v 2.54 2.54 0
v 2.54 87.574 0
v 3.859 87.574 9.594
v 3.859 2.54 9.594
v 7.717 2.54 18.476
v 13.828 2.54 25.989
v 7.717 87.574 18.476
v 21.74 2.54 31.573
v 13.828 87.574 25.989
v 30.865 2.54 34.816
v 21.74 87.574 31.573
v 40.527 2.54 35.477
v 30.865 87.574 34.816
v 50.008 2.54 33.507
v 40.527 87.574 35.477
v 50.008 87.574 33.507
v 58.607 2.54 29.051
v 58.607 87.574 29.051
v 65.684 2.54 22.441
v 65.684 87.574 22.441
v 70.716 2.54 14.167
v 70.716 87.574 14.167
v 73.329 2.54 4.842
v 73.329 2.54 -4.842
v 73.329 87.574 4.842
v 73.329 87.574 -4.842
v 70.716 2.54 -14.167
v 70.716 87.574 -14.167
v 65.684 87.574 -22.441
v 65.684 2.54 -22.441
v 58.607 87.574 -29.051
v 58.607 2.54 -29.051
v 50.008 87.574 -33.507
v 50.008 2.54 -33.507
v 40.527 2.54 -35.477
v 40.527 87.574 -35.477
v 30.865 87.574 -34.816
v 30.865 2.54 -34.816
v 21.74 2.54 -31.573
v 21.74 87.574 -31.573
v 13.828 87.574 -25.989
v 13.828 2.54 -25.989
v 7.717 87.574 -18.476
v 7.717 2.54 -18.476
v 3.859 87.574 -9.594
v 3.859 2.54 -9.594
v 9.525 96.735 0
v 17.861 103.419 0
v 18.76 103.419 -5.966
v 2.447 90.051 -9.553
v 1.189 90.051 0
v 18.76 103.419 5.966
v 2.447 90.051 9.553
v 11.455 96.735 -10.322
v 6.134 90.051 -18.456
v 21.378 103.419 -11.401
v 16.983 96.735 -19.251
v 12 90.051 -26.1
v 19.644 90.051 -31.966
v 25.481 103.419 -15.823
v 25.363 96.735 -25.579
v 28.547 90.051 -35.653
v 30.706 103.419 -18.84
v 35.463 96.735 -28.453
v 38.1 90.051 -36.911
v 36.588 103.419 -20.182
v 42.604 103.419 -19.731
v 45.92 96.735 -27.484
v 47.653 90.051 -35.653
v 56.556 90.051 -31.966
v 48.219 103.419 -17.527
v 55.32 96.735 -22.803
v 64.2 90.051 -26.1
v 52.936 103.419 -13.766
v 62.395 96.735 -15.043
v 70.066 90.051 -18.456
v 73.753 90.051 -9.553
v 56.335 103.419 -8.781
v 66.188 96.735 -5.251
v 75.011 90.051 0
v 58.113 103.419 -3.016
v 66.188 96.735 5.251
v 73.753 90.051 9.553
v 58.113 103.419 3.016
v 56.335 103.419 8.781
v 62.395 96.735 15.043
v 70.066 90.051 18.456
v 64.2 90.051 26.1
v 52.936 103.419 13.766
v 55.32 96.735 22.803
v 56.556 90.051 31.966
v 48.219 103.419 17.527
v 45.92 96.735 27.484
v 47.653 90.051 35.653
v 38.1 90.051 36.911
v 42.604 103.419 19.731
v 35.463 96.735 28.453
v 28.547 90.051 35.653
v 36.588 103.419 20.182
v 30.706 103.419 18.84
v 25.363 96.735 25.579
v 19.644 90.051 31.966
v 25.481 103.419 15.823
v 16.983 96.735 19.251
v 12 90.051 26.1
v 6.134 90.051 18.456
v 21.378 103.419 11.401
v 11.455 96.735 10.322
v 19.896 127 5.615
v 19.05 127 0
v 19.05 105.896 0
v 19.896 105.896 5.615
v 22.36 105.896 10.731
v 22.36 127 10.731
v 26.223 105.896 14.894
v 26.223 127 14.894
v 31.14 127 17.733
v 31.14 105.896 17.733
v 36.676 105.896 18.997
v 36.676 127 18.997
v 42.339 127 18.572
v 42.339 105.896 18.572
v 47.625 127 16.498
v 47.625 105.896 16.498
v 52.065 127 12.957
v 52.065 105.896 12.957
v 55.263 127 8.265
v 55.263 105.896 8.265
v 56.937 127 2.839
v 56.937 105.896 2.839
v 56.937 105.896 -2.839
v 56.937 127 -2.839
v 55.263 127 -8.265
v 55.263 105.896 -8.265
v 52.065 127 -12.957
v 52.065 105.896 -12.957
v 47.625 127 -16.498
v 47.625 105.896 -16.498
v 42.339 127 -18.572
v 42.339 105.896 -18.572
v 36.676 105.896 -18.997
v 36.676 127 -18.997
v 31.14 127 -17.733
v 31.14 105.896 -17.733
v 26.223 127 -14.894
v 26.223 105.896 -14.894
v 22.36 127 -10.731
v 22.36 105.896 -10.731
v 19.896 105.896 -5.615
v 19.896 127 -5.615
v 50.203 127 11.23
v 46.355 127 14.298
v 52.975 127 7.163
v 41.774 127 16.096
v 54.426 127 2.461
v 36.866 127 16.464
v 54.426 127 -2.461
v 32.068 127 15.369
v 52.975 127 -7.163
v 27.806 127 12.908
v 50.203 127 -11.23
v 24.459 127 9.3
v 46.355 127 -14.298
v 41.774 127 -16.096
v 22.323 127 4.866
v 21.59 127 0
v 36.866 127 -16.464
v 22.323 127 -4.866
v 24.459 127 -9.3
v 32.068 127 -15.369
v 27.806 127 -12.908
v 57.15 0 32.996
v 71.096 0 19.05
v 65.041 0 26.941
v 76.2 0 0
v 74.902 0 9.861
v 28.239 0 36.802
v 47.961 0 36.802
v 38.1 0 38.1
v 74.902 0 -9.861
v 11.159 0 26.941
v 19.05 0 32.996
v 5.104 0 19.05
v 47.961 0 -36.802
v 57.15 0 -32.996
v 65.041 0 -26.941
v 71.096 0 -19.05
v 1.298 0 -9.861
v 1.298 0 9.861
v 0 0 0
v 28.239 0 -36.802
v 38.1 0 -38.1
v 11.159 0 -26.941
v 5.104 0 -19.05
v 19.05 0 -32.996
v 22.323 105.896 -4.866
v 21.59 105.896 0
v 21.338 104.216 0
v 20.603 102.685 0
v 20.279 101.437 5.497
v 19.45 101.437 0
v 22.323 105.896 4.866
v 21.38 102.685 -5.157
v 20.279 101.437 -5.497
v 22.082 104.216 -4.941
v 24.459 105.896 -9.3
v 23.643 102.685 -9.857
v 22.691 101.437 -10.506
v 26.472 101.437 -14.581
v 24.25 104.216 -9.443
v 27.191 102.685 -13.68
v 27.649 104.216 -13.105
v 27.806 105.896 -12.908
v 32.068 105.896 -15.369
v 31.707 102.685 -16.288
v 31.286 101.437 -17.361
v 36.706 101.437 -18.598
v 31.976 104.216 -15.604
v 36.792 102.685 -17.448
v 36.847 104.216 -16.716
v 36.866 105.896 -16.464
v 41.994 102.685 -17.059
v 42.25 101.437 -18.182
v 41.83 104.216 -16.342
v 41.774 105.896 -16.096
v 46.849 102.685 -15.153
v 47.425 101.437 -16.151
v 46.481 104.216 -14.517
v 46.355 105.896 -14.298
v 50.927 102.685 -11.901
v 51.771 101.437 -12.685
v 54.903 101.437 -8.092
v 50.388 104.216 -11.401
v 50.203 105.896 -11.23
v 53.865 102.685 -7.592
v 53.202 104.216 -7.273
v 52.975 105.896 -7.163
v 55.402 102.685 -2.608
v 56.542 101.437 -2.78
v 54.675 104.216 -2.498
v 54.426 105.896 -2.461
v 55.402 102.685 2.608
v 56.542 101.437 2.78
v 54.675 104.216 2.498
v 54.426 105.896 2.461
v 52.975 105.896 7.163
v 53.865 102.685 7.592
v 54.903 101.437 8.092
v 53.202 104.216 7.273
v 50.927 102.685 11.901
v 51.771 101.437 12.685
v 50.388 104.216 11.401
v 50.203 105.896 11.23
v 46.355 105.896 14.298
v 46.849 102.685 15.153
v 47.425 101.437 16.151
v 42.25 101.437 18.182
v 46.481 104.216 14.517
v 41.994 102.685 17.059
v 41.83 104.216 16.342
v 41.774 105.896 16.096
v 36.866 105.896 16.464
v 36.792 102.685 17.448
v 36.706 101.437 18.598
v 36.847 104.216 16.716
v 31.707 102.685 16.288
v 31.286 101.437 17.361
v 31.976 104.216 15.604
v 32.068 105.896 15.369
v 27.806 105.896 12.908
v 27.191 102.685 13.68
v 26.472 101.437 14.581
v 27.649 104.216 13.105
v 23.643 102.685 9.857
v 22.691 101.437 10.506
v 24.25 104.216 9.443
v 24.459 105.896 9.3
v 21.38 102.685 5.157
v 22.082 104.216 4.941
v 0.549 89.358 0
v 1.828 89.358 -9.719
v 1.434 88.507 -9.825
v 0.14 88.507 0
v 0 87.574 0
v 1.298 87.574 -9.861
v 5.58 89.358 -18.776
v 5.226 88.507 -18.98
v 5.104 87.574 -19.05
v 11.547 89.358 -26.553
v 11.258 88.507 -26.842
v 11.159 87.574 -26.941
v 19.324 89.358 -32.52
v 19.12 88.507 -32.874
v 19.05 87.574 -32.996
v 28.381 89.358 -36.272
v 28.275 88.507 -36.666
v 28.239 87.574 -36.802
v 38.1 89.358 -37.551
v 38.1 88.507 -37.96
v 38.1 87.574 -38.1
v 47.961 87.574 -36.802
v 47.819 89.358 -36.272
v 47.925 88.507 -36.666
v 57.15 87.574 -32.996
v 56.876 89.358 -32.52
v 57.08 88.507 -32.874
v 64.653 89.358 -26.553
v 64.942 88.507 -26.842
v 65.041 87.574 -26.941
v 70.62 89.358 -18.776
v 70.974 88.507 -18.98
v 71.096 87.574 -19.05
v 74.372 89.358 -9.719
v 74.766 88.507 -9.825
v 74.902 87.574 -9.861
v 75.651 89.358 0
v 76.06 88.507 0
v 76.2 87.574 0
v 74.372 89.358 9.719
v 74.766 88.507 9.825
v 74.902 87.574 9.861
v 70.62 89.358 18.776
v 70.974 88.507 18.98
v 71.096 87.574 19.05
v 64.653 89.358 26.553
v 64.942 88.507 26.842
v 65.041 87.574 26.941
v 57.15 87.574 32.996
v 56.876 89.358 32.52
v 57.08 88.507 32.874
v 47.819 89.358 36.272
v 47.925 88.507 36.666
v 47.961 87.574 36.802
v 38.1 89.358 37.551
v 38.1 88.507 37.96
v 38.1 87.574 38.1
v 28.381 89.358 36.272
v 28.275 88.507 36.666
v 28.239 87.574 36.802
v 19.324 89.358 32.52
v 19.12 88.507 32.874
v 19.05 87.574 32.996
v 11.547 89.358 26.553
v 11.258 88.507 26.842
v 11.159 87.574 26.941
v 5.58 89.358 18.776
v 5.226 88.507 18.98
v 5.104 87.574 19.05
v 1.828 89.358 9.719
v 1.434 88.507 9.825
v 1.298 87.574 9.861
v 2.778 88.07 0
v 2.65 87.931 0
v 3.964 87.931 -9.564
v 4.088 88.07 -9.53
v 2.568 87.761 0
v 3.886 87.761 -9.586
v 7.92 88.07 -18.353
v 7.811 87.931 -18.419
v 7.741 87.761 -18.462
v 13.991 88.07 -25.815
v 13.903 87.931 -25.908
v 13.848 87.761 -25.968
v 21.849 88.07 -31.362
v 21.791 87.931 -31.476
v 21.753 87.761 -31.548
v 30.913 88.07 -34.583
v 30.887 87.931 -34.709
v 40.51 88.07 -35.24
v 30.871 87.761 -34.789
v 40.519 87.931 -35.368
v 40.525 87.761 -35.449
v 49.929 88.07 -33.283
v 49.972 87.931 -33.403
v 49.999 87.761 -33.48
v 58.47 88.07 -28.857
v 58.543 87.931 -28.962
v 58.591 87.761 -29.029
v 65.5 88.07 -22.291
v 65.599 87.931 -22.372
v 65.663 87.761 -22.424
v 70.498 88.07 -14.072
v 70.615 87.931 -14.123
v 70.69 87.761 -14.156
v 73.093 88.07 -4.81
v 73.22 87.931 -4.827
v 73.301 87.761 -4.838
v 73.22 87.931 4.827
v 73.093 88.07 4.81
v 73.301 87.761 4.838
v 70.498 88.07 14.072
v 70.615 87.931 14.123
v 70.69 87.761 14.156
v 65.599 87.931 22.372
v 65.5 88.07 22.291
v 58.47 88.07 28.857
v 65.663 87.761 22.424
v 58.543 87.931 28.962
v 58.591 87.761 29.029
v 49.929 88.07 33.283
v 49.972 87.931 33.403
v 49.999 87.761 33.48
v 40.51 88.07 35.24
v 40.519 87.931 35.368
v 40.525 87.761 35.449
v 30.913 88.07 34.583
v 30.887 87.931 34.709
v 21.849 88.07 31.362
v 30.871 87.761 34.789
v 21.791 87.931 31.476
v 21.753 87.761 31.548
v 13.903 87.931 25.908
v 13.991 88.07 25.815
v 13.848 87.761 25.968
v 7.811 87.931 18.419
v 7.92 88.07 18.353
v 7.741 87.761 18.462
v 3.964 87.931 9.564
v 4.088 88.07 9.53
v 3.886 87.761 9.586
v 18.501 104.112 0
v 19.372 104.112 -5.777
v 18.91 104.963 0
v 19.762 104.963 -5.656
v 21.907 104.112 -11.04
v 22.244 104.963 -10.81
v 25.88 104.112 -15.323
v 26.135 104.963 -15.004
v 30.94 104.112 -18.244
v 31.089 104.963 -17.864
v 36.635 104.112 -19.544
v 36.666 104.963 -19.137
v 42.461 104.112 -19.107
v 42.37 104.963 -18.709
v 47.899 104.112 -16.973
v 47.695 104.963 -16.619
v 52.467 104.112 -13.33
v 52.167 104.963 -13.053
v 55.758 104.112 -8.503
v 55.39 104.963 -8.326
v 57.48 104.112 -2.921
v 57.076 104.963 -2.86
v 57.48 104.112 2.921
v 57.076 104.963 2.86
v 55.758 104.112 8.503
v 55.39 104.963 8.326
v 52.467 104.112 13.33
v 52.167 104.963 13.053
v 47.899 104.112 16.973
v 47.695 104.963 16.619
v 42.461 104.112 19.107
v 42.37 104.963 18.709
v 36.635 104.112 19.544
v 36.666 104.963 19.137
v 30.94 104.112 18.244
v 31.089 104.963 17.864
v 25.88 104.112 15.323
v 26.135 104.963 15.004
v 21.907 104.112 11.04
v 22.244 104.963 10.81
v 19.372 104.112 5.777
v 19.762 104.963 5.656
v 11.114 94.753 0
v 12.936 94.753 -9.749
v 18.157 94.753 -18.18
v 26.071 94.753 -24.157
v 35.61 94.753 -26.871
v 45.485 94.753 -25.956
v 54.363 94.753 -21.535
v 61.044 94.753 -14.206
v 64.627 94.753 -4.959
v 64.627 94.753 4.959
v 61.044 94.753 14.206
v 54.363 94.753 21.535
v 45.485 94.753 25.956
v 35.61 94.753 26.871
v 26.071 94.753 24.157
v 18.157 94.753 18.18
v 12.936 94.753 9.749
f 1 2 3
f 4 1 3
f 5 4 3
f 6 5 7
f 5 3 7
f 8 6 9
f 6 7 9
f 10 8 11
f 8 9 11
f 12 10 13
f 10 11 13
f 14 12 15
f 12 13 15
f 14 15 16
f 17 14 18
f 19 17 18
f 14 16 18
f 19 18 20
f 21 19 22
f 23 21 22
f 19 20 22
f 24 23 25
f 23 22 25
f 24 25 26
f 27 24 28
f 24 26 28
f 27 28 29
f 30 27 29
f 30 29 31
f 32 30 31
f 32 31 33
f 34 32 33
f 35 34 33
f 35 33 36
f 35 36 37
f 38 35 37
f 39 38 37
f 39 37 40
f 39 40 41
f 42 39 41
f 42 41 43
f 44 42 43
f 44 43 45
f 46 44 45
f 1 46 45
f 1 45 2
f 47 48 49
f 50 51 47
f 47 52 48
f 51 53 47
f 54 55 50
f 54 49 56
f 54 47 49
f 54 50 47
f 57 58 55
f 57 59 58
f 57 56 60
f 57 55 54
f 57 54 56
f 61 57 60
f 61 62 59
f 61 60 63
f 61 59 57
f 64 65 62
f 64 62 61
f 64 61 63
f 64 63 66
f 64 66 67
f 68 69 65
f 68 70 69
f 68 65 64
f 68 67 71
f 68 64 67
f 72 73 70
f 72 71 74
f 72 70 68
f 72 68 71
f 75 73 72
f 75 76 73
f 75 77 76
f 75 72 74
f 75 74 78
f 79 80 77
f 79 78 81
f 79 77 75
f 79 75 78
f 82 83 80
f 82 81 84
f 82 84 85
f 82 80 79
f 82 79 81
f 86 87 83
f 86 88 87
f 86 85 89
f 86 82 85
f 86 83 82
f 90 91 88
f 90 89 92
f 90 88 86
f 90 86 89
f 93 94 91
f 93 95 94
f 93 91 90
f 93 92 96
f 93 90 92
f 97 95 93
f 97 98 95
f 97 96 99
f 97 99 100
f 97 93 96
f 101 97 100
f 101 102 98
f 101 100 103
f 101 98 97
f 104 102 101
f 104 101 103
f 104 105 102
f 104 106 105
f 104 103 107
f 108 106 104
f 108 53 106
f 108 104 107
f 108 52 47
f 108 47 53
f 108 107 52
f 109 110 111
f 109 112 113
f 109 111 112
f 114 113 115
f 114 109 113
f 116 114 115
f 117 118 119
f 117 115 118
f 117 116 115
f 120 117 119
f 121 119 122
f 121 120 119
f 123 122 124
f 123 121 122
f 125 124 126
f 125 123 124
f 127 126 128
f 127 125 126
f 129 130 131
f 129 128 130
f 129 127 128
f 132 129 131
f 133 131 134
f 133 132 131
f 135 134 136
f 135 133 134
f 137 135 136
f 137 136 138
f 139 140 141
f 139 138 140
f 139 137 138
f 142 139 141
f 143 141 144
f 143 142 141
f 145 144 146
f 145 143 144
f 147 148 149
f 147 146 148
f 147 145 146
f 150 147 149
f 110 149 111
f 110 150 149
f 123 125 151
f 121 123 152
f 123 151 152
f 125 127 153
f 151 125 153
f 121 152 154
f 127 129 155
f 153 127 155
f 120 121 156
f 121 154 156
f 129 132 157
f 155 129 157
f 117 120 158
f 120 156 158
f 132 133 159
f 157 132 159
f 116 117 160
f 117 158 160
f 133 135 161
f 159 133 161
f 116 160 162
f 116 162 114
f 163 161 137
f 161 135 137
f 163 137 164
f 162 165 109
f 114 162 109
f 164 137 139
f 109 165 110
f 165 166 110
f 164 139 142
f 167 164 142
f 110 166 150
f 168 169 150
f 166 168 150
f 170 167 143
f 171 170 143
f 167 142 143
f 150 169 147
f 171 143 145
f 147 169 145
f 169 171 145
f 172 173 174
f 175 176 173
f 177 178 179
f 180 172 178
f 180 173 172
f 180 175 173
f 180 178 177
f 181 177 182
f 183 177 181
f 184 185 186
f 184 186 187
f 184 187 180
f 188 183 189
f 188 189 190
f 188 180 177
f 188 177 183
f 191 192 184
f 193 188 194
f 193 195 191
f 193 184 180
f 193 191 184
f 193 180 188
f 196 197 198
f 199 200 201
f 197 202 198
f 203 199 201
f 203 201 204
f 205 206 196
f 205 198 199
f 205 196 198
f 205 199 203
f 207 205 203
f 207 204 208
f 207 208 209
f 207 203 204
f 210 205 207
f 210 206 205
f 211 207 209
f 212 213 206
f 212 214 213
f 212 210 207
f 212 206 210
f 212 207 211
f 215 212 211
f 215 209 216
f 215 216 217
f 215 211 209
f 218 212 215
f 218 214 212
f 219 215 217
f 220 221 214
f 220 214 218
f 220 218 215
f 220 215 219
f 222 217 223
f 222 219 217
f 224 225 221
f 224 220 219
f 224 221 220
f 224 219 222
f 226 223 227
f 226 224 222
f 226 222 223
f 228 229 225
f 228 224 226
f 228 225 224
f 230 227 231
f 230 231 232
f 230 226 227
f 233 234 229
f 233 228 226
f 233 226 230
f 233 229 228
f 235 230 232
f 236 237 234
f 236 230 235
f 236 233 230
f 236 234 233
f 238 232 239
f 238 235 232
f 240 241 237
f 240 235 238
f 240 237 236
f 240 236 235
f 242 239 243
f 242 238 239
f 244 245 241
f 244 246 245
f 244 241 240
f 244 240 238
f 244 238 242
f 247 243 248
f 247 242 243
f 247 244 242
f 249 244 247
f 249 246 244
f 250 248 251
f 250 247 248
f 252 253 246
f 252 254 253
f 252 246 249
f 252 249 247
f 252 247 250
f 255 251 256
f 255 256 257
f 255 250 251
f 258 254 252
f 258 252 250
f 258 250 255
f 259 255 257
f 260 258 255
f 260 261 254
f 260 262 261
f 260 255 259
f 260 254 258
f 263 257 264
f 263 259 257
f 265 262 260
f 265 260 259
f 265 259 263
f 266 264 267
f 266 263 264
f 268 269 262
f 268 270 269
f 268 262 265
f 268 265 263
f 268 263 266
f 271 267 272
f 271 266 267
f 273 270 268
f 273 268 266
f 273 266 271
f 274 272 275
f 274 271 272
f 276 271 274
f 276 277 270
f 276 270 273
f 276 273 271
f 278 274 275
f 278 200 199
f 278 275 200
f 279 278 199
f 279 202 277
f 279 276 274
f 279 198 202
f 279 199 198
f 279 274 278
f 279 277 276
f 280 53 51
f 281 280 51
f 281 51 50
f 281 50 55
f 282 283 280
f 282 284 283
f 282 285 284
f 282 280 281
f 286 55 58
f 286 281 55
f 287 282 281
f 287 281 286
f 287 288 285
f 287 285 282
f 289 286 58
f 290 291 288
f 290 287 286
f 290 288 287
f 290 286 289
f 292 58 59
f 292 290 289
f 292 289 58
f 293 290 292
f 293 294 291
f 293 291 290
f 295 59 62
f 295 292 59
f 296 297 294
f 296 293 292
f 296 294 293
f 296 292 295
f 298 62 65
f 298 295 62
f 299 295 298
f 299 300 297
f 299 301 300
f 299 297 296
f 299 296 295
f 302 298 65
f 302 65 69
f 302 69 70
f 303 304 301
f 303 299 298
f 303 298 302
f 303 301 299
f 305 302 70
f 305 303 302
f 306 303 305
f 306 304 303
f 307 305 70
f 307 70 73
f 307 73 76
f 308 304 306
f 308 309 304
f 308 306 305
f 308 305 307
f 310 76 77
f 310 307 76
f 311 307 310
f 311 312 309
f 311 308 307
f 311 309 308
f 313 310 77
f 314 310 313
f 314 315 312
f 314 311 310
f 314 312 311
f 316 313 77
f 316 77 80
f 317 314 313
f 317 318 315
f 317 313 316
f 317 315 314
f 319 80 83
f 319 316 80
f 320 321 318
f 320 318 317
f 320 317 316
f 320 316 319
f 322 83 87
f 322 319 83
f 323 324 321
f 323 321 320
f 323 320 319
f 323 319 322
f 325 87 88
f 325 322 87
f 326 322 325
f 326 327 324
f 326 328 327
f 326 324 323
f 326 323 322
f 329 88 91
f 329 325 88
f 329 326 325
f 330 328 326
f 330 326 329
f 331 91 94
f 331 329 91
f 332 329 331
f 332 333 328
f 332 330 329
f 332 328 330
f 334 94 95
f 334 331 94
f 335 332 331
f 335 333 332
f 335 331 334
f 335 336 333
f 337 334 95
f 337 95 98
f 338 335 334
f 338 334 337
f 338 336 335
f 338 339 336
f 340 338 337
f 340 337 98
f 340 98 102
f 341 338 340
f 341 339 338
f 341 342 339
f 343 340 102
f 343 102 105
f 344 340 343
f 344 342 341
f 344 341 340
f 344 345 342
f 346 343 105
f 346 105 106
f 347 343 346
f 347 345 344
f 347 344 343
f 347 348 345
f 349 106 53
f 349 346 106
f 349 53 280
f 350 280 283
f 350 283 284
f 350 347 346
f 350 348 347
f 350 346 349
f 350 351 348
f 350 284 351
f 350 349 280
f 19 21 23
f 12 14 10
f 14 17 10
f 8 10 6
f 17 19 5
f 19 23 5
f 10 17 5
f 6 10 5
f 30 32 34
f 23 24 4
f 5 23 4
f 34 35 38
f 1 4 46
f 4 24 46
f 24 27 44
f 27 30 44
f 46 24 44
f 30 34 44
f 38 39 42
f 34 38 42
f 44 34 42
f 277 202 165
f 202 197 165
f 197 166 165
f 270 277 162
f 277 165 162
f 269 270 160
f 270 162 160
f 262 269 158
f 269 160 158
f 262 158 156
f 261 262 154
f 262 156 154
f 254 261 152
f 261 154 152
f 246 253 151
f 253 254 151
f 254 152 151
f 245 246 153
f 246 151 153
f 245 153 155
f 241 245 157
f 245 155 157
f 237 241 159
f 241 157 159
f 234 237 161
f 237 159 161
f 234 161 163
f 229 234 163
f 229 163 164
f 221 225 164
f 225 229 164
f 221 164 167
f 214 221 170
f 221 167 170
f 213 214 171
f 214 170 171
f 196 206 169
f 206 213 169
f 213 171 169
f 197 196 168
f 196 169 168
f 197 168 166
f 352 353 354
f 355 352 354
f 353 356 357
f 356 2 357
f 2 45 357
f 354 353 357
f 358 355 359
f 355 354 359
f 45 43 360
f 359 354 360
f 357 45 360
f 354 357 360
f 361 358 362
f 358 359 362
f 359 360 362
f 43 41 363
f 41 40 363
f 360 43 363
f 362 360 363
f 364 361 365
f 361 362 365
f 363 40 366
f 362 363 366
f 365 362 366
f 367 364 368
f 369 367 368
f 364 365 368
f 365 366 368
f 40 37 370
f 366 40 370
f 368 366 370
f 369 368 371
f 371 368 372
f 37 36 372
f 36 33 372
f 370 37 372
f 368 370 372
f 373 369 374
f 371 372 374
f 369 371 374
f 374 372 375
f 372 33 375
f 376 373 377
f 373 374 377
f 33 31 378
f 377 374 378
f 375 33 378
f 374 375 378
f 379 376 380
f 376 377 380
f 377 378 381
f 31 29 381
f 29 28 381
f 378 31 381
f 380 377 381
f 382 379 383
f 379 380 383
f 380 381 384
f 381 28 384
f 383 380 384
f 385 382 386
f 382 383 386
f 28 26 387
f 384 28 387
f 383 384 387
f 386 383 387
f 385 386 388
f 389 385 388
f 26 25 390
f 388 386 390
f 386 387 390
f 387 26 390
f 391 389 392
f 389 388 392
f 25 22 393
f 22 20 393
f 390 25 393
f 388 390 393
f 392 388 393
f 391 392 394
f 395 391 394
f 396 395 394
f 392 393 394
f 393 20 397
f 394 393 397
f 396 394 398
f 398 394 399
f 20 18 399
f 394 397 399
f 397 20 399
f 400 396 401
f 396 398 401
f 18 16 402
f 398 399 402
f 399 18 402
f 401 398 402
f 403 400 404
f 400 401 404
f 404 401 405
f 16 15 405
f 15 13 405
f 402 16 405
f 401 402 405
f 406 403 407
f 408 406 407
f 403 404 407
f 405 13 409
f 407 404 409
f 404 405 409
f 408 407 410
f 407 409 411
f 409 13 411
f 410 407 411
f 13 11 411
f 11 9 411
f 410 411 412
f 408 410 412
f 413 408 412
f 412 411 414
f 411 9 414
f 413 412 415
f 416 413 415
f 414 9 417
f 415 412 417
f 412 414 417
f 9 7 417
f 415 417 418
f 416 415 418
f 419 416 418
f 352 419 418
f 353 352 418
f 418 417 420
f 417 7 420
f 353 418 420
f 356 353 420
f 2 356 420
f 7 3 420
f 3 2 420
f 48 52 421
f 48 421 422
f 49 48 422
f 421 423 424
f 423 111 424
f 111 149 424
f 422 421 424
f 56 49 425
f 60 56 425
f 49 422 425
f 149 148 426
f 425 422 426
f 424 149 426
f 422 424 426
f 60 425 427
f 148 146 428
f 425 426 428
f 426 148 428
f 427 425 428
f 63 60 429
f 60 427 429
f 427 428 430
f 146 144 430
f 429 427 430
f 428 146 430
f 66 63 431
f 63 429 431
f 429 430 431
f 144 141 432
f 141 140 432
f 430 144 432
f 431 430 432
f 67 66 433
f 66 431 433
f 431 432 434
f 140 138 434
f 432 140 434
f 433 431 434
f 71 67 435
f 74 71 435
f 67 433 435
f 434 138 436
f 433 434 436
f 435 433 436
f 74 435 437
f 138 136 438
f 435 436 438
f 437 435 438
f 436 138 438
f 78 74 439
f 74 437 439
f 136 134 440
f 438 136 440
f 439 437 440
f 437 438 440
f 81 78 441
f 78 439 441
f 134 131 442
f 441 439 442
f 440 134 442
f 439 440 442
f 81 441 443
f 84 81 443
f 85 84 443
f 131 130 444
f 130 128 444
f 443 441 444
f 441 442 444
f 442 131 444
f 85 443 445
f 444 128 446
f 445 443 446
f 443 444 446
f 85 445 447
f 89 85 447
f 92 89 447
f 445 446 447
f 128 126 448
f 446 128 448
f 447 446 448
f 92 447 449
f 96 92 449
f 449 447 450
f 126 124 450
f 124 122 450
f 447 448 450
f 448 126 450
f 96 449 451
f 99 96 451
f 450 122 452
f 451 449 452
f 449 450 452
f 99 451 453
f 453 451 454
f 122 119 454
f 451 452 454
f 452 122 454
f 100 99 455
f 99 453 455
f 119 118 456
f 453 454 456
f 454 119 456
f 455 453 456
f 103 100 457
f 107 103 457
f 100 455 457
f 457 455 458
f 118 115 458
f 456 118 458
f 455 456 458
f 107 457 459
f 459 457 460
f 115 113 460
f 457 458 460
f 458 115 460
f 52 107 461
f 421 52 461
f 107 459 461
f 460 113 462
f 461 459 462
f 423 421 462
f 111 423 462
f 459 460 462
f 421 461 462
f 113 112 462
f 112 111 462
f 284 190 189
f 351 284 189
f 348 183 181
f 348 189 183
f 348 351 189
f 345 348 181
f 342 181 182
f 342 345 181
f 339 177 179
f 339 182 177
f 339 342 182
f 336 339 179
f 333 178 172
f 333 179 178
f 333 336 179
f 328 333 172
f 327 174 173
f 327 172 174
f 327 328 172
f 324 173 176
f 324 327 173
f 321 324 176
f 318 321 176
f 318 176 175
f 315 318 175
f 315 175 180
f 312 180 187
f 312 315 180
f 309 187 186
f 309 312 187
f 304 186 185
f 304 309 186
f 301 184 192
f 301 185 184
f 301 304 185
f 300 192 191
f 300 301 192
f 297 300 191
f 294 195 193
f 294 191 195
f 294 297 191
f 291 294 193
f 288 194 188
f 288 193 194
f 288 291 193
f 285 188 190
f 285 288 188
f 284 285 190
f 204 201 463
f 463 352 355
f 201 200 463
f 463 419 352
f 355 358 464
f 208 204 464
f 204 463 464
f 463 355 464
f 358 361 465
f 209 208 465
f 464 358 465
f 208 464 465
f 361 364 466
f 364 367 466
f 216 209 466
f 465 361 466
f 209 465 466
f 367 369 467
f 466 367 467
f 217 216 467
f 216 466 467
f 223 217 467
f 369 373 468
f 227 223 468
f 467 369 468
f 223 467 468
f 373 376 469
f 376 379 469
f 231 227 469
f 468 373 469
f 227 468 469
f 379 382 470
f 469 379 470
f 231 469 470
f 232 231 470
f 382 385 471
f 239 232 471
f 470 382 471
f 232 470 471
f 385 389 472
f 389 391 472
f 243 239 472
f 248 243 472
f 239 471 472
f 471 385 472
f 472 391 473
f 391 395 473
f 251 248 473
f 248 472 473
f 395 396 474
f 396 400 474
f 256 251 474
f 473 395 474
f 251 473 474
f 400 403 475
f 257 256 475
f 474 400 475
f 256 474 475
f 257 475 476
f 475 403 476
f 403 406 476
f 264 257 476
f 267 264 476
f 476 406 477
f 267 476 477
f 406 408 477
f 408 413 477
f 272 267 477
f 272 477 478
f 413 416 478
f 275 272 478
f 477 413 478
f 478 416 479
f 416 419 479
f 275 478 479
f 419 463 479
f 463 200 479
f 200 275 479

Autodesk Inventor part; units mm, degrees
ref_plane "YZ Plane" through (0, 0, 0) normal (1, 0, 0) x (0, 1, 0)
ref_plane "XZ Plane" through (0, 0, 0) normal (0, 1, 0) x (-1, 0, 0)
ref_plane "XY Plane" through (0, 0, 0) normal (0, 0, 1) x (1, 0, 0)
sketch "Sketch1" plane through (0, 0, 0) normal (0, 0, 1) x (1, 0, 0)
  line L0 (0, 0) -> (0, 87.5741)
  line L1 (1.1889, 90.0512) -> (17.8611, 103.4187)
  line L2 (19.05, 105.8958) -> (19.05, 127)
  line L3 (19.05, 127) -> (38.1, 127)
  line L4 (38.1, 127) -> (38.1, 0)
  line L5 (38.1, 0) -> (0, 0)
  arc A0 (17.8611, 103.4187) -> (19.05, 105.8958) centre (15.875, 105.8958) ccw
  arc A1 (1.1889, 90.0512) -> (0, 87.5741) centre (3.175, 87.5741) ccw
  dimension "d0" = 127
  dimension "d1" = 38.1
  dimension "d2" = 19.05
  dimension "d3" = 3.175
revolve "Revolution1" add sketch "Sketch1" angle 360 about axis through (38.1, 127, 0) along (0, -1, 0)
shell "Shell1" thickness 2.54 removed faces 1 at (38.9963, 127, 5.2259)
properties part number "bottle"
